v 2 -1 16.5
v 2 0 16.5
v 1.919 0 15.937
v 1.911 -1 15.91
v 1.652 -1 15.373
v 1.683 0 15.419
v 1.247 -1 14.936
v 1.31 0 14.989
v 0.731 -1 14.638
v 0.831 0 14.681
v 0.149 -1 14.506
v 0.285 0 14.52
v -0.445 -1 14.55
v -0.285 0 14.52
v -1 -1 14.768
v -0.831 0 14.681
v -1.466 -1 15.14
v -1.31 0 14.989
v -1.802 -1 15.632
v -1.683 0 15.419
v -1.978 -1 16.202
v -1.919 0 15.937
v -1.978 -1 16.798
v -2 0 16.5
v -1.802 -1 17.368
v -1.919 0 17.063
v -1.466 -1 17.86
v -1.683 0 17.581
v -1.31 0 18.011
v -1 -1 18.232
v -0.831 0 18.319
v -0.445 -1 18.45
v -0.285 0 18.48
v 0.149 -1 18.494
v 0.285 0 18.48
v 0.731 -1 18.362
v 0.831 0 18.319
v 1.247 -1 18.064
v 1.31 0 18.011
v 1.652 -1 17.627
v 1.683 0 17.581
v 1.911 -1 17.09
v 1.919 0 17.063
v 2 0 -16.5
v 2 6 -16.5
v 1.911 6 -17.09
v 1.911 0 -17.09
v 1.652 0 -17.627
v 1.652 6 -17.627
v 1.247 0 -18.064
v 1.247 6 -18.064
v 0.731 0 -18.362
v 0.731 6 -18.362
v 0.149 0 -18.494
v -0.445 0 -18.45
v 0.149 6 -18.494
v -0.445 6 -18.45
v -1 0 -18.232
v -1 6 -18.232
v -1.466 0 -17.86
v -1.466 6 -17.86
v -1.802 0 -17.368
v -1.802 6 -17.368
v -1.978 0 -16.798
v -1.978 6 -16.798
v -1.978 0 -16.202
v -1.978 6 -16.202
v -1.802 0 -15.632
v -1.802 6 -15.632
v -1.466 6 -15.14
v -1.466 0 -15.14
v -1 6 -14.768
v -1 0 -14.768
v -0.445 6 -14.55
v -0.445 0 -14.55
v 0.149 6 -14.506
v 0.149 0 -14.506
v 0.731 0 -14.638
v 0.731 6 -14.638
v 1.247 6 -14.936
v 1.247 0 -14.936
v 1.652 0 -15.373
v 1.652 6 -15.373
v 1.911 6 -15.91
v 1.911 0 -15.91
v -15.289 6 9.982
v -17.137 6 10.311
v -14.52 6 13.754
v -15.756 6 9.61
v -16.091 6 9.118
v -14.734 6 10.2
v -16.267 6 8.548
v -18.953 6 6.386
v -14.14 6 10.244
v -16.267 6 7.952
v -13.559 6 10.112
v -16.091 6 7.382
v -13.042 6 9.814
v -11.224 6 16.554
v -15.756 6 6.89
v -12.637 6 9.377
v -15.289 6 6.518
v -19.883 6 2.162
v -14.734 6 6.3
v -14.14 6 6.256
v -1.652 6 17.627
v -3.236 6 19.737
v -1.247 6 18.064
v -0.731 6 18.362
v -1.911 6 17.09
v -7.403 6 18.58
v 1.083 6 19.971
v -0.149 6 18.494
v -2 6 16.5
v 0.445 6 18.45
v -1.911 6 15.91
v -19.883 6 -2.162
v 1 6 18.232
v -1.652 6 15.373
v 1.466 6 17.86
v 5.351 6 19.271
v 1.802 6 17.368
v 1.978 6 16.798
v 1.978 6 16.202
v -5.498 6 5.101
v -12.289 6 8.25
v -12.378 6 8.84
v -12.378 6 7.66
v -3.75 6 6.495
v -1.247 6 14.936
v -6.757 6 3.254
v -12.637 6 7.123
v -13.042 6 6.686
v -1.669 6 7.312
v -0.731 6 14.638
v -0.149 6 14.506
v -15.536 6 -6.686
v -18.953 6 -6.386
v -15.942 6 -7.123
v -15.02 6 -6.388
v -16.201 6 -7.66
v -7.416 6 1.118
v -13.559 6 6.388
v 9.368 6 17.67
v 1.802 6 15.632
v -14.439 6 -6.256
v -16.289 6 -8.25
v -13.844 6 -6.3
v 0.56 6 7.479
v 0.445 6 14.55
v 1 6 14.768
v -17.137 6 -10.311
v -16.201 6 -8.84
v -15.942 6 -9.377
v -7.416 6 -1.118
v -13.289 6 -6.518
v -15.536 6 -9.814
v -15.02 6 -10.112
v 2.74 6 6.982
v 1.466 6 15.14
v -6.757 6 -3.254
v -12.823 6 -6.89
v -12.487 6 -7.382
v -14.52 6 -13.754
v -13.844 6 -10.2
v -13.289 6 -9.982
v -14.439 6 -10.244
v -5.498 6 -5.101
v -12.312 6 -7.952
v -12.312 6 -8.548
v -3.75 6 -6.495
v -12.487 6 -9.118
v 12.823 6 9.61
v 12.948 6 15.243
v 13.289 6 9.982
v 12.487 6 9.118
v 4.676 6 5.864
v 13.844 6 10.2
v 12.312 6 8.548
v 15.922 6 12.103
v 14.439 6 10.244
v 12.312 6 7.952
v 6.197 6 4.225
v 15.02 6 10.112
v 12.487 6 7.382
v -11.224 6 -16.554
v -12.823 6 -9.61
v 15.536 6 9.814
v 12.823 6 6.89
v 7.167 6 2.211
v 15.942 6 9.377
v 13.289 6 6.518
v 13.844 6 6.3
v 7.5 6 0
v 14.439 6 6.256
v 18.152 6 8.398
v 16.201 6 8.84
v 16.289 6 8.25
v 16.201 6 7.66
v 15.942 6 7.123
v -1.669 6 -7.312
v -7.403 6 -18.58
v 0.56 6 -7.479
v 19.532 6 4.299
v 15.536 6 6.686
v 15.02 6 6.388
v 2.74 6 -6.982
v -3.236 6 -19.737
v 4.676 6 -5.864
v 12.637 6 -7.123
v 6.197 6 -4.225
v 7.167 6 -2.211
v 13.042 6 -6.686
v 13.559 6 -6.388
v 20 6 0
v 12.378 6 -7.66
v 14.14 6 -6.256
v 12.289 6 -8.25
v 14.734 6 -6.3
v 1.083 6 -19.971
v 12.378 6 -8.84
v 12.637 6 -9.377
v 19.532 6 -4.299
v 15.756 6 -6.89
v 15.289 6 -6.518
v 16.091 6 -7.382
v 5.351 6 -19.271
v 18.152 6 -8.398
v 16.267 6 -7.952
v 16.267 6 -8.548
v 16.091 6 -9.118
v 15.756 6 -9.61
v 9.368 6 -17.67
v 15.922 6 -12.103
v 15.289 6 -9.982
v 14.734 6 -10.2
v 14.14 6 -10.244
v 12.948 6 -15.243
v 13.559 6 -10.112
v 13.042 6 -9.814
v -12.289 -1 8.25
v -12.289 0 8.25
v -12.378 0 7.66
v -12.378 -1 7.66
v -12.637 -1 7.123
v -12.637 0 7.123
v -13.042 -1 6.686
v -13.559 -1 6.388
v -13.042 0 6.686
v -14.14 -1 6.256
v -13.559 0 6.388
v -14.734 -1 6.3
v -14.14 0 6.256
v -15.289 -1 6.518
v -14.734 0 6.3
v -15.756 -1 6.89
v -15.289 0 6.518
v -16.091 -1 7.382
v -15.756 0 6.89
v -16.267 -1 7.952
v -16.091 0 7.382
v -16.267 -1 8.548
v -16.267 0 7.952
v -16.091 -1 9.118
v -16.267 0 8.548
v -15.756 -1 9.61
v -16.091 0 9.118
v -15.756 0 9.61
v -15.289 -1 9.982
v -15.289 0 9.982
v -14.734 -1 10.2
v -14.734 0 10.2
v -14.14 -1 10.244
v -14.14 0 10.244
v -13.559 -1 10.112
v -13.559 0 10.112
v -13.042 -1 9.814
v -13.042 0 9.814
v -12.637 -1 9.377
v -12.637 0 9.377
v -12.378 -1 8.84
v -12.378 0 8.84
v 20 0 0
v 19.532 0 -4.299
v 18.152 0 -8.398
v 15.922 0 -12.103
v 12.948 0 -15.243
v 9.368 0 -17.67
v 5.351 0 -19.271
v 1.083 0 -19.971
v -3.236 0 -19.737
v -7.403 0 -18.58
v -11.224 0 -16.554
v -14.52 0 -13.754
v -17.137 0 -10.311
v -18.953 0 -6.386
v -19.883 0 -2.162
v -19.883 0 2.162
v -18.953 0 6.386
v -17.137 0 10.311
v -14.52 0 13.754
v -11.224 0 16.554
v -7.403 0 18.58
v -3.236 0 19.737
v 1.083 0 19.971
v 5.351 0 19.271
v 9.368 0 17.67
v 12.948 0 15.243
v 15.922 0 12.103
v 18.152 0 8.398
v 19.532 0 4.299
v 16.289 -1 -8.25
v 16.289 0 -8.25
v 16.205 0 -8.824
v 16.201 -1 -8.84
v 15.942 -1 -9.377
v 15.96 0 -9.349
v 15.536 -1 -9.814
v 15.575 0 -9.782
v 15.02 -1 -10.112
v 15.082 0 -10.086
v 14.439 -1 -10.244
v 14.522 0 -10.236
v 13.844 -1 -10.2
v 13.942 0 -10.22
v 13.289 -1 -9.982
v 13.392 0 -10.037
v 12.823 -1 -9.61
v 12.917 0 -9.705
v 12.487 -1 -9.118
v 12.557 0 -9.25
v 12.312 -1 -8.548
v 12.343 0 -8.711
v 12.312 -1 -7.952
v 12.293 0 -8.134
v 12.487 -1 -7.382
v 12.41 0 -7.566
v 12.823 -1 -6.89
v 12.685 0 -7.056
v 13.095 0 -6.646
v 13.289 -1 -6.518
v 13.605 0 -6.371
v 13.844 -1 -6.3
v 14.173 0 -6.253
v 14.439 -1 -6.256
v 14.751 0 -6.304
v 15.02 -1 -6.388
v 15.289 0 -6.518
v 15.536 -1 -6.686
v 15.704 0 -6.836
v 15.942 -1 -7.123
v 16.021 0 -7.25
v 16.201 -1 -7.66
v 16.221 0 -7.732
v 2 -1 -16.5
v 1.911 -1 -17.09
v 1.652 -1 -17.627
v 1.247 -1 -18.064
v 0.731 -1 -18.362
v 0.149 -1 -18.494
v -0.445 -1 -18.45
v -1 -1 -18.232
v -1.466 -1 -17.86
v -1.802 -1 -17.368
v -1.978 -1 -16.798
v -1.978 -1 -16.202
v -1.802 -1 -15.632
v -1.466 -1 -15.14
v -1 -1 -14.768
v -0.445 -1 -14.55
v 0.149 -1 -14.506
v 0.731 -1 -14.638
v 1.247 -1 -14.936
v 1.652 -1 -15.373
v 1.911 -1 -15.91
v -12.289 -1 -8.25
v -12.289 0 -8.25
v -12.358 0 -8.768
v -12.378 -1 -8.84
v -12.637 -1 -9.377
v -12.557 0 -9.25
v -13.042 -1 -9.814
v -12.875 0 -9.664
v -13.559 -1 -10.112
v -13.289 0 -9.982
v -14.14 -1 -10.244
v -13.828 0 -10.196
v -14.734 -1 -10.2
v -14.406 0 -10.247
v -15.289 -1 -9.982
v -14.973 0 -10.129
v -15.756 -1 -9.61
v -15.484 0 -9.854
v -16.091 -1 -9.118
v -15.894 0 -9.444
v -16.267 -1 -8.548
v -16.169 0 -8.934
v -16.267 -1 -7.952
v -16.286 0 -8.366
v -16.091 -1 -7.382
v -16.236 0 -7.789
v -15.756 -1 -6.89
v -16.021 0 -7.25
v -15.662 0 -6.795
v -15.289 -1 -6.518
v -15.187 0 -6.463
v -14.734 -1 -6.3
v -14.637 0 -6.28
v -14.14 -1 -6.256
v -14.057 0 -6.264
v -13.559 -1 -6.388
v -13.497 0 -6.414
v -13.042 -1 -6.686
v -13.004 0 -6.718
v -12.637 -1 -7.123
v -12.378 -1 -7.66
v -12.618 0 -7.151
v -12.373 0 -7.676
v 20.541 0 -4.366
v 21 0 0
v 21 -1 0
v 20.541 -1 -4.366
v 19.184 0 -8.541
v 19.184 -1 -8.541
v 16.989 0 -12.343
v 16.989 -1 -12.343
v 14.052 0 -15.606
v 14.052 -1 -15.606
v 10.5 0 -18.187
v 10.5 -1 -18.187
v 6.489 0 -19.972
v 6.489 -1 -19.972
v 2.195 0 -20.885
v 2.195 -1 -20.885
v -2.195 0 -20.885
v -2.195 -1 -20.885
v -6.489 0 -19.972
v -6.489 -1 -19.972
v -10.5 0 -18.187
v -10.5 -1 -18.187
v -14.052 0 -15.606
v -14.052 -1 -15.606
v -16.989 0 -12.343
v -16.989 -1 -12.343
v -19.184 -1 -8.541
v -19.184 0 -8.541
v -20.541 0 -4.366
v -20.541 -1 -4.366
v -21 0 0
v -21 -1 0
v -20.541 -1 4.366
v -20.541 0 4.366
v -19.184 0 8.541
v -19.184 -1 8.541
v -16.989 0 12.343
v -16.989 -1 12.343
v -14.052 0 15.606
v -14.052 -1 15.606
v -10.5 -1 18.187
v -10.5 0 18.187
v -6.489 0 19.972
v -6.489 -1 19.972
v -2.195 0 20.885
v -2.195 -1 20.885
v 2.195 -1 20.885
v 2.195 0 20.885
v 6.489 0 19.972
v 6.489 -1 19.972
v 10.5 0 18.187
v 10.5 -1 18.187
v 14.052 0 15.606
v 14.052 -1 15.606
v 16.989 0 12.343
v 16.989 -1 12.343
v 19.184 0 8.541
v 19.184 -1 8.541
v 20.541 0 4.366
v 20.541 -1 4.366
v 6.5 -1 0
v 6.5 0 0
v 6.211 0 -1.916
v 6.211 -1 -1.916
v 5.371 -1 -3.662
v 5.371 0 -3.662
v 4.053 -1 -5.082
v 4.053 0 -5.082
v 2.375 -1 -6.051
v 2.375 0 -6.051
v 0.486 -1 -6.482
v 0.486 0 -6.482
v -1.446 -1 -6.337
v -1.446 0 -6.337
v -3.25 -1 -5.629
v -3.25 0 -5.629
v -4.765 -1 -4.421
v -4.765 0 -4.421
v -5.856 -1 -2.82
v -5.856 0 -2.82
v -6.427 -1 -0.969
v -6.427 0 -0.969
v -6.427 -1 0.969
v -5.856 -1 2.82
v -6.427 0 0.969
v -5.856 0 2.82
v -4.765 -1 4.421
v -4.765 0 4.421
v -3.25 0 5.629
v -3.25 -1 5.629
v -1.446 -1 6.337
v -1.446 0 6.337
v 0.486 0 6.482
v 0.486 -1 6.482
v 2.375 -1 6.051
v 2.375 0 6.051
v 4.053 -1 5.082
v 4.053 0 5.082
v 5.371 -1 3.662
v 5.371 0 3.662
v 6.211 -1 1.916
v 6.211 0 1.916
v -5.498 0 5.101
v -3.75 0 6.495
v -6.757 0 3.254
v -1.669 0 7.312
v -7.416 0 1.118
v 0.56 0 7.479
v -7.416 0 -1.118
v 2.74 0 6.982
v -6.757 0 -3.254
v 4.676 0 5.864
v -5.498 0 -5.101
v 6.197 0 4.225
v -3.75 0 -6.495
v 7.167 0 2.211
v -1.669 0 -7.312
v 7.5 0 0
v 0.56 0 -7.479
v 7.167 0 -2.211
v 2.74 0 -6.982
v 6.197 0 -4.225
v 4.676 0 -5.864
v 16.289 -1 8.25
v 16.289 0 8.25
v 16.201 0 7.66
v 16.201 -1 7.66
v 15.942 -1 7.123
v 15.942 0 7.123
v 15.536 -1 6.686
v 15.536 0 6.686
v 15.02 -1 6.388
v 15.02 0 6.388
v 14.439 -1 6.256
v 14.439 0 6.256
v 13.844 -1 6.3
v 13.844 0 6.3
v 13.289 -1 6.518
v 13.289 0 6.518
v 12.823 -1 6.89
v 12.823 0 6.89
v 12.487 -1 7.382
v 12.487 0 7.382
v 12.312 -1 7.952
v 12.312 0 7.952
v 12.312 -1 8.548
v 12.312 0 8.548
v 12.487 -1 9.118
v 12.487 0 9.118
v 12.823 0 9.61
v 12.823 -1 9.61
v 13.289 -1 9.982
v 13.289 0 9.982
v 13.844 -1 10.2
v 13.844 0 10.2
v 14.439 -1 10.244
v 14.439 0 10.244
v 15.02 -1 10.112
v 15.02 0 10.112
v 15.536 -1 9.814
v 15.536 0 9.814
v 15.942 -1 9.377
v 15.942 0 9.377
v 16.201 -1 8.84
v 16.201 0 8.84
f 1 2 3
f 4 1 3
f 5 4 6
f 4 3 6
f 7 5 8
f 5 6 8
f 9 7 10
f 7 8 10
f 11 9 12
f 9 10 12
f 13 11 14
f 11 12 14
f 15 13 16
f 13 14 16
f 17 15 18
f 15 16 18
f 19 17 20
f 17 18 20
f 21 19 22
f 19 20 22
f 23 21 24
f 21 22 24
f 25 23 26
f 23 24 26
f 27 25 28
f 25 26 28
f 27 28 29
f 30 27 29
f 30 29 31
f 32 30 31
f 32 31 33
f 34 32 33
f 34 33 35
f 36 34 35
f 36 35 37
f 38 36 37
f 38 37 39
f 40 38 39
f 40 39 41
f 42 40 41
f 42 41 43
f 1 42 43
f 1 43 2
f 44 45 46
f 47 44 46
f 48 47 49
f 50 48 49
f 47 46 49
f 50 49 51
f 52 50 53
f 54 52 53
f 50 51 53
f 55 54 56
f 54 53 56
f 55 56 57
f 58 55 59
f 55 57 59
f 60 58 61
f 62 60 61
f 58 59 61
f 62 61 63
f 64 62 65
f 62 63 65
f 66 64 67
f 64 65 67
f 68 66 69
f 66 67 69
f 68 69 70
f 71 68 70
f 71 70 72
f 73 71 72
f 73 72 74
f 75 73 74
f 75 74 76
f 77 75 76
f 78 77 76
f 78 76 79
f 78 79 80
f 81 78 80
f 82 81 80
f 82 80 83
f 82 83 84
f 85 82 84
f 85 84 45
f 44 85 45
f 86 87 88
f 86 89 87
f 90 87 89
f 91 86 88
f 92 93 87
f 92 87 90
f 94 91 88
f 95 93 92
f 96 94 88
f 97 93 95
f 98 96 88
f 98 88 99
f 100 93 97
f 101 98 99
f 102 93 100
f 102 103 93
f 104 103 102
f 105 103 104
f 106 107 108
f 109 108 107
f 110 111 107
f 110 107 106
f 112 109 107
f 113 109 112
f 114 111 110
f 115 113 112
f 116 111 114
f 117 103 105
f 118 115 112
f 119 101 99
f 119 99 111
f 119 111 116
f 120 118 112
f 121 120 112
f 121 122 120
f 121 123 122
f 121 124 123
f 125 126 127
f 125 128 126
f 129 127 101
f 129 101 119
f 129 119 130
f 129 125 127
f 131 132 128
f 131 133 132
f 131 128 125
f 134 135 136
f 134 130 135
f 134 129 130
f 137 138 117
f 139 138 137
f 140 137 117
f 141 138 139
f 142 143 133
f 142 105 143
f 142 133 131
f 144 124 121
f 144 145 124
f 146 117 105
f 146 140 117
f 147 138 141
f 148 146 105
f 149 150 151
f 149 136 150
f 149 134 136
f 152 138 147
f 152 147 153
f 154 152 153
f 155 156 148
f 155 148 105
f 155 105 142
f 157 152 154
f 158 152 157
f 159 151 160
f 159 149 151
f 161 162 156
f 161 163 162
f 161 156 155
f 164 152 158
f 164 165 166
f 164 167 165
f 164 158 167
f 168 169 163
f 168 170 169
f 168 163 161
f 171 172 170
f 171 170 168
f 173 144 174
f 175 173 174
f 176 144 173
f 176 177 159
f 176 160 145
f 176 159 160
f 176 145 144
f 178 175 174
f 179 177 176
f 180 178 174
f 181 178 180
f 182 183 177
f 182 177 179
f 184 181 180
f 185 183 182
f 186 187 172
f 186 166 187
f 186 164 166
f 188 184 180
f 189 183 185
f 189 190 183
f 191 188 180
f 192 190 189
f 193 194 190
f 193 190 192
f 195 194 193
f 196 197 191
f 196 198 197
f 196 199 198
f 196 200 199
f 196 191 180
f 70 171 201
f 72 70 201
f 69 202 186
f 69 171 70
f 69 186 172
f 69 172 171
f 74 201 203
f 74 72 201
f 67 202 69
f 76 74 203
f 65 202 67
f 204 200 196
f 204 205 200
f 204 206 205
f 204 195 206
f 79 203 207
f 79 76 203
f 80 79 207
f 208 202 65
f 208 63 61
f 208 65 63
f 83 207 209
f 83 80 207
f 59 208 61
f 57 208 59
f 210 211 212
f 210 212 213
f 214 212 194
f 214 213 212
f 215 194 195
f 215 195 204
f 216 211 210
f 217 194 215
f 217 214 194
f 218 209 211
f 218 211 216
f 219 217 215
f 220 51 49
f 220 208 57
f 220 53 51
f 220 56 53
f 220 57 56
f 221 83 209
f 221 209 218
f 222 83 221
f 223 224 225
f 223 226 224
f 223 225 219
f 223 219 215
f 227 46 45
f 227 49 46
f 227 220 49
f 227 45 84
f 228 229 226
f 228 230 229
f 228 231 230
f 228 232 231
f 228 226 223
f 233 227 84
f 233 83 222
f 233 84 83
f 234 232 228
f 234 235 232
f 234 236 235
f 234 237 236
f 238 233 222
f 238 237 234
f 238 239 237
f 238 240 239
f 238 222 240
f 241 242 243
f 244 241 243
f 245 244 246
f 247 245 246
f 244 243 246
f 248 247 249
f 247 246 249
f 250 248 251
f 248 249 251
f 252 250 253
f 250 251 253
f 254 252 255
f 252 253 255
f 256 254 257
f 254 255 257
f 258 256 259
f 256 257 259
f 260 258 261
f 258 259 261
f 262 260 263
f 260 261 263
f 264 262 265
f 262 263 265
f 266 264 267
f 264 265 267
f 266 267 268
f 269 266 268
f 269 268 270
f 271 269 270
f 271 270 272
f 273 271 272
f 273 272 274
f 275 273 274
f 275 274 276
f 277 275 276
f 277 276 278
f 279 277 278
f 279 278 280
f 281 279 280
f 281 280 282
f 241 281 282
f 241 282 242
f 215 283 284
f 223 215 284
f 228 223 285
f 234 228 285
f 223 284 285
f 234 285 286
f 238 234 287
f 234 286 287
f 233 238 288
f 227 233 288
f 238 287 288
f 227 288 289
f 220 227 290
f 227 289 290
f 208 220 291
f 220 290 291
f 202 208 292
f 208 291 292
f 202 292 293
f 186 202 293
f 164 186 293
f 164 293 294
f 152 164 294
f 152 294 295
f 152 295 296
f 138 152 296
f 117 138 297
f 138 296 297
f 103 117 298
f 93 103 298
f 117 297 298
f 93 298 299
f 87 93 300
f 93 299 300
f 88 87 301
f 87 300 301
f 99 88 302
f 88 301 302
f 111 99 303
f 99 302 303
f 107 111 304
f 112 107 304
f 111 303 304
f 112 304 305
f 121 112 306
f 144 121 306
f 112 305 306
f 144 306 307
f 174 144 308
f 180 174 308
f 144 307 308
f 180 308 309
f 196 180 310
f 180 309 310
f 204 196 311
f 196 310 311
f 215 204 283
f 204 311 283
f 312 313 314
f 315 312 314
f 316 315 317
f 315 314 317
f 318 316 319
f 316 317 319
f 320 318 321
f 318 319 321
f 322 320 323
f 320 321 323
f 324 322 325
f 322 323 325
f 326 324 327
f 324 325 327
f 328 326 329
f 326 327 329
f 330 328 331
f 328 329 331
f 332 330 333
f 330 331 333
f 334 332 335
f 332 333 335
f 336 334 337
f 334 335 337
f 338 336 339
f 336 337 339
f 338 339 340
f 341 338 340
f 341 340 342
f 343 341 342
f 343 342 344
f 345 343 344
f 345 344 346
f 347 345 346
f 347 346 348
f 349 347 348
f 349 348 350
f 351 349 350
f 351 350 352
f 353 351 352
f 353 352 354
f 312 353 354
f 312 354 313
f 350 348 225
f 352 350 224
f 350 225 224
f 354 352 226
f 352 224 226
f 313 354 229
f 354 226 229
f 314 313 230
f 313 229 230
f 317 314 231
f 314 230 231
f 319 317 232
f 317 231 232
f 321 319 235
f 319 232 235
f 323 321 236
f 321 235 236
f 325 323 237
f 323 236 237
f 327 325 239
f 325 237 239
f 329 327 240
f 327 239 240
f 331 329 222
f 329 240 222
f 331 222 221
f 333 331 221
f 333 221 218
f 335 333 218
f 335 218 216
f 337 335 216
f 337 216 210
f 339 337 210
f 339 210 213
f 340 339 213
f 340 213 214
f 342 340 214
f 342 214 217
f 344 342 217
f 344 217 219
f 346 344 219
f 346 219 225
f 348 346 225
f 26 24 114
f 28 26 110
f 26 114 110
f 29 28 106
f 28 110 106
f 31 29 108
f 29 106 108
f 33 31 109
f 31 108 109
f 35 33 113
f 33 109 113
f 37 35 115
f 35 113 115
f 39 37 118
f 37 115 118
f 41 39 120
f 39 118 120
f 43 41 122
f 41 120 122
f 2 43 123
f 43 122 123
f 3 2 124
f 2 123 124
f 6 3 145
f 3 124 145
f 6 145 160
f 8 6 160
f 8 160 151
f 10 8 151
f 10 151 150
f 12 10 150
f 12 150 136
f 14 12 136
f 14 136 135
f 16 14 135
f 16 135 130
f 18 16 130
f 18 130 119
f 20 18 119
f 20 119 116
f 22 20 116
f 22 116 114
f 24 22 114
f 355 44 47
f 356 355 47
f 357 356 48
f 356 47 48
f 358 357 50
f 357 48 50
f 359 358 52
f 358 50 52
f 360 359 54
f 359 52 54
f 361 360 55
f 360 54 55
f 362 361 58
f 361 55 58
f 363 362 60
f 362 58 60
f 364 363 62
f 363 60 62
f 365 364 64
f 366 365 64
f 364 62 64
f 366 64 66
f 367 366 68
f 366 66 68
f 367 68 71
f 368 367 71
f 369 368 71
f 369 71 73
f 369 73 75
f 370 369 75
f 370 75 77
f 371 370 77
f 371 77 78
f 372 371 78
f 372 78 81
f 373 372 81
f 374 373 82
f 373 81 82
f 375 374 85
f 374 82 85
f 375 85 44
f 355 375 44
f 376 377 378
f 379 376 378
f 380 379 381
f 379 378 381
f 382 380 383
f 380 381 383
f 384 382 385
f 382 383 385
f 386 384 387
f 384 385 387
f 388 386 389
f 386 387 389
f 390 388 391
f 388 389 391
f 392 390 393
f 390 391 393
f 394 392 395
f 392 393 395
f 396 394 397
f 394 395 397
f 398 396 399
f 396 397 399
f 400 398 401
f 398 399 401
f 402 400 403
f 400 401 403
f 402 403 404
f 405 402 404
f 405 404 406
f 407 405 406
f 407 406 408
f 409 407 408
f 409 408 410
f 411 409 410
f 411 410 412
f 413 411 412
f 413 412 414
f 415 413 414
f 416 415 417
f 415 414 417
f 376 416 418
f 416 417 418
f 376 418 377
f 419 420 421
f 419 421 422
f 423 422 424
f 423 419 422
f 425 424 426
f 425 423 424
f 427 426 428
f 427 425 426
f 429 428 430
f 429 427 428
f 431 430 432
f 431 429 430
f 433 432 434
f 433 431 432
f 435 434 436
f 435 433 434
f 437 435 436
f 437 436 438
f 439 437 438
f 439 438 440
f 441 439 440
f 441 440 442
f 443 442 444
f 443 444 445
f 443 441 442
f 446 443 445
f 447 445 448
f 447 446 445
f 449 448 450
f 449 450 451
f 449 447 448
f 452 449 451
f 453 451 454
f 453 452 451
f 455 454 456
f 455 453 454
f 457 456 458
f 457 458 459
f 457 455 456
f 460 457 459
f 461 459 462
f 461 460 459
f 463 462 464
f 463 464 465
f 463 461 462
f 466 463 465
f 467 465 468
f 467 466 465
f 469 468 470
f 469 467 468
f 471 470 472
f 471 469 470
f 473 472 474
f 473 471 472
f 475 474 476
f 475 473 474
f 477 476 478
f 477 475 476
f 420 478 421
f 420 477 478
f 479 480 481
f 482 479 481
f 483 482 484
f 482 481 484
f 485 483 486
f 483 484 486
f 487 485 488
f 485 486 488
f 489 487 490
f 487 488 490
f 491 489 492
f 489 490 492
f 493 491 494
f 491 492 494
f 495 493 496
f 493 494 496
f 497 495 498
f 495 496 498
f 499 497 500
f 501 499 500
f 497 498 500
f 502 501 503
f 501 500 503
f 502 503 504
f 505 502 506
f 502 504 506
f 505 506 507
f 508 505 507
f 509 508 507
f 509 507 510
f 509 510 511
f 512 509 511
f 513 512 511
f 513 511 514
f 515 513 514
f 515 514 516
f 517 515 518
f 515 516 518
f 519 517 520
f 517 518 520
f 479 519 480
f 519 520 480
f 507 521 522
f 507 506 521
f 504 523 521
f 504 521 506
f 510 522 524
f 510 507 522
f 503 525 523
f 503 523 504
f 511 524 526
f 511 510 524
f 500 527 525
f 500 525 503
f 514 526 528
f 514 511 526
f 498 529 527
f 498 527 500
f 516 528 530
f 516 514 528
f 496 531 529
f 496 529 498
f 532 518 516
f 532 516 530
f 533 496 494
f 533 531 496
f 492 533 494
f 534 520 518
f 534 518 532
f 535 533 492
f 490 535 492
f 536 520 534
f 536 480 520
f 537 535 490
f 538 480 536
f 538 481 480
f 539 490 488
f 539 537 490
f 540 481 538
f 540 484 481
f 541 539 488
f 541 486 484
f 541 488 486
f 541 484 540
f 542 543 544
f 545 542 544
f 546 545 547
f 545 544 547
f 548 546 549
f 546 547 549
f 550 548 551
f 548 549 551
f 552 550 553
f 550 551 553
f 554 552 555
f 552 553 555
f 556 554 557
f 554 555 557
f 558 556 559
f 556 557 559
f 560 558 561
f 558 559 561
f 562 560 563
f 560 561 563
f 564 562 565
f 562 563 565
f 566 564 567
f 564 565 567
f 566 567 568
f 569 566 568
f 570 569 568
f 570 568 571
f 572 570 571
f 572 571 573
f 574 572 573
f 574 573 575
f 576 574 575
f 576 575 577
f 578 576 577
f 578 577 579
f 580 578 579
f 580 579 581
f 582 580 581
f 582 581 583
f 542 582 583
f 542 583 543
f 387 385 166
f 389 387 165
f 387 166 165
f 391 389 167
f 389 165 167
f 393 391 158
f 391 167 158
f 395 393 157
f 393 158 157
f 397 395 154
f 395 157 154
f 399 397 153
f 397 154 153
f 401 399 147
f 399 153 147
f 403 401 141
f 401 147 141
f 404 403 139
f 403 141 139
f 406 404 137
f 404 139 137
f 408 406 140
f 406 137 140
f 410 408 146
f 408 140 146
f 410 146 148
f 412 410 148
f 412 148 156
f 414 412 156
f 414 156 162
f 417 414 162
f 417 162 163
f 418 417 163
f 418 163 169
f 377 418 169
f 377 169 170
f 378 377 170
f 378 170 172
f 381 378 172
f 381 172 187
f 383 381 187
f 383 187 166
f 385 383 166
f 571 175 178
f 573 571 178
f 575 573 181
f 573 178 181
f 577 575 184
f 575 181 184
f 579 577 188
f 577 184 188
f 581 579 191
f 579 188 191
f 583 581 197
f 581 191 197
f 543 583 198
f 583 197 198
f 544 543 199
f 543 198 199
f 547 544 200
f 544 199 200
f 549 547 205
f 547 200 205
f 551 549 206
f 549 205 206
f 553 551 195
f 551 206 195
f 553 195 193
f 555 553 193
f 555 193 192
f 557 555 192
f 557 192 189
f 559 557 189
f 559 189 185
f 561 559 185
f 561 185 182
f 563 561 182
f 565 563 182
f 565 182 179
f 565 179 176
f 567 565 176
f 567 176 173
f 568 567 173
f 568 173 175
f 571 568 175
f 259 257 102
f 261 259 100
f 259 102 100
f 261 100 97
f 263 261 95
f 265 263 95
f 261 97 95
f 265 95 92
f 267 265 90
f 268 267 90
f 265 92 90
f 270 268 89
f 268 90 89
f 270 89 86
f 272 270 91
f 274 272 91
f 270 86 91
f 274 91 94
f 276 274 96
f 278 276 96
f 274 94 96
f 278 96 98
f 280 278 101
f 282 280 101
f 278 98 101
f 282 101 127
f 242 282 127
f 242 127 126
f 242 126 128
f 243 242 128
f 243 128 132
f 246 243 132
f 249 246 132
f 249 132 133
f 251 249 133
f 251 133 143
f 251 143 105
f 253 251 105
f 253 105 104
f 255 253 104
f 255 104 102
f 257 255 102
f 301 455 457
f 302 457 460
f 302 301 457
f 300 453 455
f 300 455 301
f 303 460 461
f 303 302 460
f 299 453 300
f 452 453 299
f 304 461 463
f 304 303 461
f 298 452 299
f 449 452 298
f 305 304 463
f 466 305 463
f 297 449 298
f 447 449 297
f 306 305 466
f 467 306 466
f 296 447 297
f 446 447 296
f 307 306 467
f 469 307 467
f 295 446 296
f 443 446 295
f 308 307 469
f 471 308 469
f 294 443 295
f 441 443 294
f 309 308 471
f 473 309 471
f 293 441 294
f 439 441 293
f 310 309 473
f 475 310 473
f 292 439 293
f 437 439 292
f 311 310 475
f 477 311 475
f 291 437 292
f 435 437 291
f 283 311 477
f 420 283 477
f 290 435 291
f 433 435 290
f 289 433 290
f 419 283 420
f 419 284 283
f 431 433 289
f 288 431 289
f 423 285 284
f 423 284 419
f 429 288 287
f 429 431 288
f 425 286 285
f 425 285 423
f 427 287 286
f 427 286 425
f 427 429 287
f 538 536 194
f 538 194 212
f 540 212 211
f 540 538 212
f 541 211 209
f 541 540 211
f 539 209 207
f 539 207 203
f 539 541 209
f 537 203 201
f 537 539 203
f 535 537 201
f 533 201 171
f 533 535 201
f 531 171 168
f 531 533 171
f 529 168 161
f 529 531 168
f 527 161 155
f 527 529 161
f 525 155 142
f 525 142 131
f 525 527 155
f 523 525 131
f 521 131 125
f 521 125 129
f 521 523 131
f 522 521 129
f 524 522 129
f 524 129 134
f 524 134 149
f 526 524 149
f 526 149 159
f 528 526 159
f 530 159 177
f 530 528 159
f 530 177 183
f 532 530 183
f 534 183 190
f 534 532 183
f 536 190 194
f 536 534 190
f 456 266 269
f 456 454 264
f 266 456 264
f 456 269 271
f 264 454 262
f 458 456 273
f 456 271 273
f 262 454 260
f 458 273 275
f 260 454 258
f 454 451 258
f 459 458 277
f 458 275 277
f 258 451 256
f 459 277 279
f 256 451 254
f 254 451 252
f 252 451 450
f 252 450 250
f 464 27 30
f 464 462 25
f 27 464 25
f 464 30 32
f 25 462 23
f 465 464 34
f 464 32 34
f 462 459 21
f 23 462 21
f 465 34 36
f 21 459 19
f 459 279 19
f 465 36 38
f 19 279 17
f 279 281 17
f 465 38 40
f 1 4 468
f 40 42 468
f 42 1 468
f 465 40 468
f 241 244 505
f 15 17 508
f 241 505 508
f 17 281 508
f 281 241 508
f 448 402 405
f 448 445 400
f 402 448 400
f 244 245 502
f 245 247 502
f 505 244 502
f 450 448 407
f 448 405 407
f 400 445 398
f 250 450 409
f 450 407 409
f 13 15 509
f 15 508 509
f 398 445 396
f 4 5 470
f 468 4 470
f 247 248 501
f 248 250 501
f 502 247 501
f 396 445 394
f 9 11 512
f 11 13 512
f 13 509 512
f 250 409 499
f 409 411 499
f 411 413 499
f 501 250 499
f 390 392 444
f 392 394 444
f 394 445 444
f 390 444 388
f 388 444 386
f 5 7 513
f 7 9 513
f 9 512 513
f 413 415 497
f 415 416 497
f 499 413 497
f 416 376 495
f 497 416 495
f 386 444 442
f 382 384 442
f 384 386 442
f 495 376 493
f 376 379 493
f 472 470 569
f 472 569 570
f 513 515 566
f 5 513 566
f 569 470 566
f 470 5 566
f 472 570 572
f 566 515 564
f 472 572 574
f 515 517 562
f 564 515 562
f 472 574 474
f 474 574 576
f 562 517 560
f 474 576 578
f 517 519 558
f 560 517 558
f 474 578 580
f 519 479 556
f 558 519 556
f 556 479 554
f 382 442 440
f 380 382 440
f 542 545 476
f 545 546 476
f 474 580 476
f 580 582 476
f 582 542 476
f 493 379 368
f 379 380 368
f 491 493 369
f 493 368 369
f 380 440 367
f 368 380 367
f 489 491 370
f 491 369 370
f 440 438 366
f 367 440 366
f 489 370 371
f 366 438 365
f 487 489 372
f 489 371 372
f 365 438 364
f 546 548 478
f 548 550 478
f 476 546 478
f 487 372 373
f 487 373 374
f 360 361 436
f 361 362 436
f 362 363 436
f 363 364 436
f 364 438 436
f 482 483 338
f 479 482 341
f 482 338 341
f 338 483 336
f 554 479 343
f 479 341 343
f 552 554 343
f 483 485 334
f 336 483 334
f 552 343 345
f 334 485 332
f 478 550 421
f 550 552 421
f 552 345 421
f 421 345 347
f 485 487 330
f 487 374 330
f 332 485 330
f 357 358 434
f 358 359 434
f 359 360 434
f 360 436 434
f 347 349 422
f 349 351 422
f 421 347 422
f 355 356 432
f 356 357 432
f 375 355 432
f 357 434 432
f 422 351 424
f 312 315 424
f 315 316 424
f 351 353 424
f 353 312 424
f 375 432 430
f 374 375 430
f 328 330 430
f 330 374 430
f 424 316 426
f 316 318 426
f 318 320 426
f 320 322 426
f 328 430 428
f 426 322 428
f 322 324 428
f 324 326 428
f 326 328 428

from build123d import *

# Parameters (mm, degrees)
SKETCH1_R           = 20
SKETCH1_R_2         = 7.5
BOSS_EXTRUDE1_DEPTH = 6
SKETCH2_R           = 2
CUT_EXTRUDE1_DEPTH  = 7
CIRPATTERN2_COUNT   = 6
SKETCH3_R           = 21
SKETCH3_R_2         = 6.5
SKETCH3_R_3         = 2
BOSS_EXTRUDE2_DEPTH = 1


with BuildPart() as part:
    # Sketch1 → Boss-Extrude1 (new body)
    with BuildSketch(Plane(origin=(0, 0, 0), x_dir=(1, 0, 0), z_dir=(0, 1, 0))):
        Circle(SKETCH1_R)
        Circle(SKETCH1_R_2, mode=Mode.SUBTRACT)
    extrude(amount=BOSS_EXTRUDE1_DEPTH)

    # Sketch2 → Cut-Extrude1 (cut, through all)
    with BuildSketch(Plane(origin=(0, 6, 0), x_dir=(1, 0, 0), z_dir=(0, 1, 0))):
        with Locations((0, 16.5)):
            Circle(SKETCH2_R)
    cut_extrude1 = extrude(amount=-CUT_EXTRUDE1_DEPTH, mode=Mode.SUBTRACT)

    # CirPattern2: Cut-Extrude1 ×6 about axis
    cirpattern2_axis = Axis((0, 0, 0), (0, 1, 0))
    for i in range(1, CIRPATTERN2_COUNT):
        add(cut_extrude1.rotate(cirpattern2_axis, i * 360 / CIRPATTERN2_COUNT), mode=Mode.SUBTRACT)

    # Sketch3 → Boss-Extrude2 (add)
    with BuildSketch(Plane(origin=(0, 0, 0), x_dir=(1, 0, 0), z_dir=(0, 1, 0))):
        Circle(SKETCH3_R)
        Circle(SKETCH3_R_2, mode=Mode.SUBTRACT)
        with Locations((-14.289419162, -8.25)):
            Circle(SKETCH3_R_3, mode=Mode.SUBTRACT)
        with Locations((0, -16.5)):
            Circle(SKETCH3_R_3, mode=Mode.SUBTRACT)
        with Locations((14.289419162, -8.25)):
            Circle(SKETCH3_R_3, mode=Mode.SUBTRACT)
        with Locations((14.289419162, 8.25)):
            Circle(SKETCH3_R_3, mode=Mode.SUBTRACT)
        with Locations((0, 16.5)):
            Circle(SKETCH3_R_3, mode=Mode.SUBTRACT)
        with Locations((-14.289419162, 8.25)):
            Circle(SKETCH3_R_3, mode=Mode.SUBTRACT)
    extrude(amount=-BOSS_EXTRUDE2_DEPTH)


solid = part.part
